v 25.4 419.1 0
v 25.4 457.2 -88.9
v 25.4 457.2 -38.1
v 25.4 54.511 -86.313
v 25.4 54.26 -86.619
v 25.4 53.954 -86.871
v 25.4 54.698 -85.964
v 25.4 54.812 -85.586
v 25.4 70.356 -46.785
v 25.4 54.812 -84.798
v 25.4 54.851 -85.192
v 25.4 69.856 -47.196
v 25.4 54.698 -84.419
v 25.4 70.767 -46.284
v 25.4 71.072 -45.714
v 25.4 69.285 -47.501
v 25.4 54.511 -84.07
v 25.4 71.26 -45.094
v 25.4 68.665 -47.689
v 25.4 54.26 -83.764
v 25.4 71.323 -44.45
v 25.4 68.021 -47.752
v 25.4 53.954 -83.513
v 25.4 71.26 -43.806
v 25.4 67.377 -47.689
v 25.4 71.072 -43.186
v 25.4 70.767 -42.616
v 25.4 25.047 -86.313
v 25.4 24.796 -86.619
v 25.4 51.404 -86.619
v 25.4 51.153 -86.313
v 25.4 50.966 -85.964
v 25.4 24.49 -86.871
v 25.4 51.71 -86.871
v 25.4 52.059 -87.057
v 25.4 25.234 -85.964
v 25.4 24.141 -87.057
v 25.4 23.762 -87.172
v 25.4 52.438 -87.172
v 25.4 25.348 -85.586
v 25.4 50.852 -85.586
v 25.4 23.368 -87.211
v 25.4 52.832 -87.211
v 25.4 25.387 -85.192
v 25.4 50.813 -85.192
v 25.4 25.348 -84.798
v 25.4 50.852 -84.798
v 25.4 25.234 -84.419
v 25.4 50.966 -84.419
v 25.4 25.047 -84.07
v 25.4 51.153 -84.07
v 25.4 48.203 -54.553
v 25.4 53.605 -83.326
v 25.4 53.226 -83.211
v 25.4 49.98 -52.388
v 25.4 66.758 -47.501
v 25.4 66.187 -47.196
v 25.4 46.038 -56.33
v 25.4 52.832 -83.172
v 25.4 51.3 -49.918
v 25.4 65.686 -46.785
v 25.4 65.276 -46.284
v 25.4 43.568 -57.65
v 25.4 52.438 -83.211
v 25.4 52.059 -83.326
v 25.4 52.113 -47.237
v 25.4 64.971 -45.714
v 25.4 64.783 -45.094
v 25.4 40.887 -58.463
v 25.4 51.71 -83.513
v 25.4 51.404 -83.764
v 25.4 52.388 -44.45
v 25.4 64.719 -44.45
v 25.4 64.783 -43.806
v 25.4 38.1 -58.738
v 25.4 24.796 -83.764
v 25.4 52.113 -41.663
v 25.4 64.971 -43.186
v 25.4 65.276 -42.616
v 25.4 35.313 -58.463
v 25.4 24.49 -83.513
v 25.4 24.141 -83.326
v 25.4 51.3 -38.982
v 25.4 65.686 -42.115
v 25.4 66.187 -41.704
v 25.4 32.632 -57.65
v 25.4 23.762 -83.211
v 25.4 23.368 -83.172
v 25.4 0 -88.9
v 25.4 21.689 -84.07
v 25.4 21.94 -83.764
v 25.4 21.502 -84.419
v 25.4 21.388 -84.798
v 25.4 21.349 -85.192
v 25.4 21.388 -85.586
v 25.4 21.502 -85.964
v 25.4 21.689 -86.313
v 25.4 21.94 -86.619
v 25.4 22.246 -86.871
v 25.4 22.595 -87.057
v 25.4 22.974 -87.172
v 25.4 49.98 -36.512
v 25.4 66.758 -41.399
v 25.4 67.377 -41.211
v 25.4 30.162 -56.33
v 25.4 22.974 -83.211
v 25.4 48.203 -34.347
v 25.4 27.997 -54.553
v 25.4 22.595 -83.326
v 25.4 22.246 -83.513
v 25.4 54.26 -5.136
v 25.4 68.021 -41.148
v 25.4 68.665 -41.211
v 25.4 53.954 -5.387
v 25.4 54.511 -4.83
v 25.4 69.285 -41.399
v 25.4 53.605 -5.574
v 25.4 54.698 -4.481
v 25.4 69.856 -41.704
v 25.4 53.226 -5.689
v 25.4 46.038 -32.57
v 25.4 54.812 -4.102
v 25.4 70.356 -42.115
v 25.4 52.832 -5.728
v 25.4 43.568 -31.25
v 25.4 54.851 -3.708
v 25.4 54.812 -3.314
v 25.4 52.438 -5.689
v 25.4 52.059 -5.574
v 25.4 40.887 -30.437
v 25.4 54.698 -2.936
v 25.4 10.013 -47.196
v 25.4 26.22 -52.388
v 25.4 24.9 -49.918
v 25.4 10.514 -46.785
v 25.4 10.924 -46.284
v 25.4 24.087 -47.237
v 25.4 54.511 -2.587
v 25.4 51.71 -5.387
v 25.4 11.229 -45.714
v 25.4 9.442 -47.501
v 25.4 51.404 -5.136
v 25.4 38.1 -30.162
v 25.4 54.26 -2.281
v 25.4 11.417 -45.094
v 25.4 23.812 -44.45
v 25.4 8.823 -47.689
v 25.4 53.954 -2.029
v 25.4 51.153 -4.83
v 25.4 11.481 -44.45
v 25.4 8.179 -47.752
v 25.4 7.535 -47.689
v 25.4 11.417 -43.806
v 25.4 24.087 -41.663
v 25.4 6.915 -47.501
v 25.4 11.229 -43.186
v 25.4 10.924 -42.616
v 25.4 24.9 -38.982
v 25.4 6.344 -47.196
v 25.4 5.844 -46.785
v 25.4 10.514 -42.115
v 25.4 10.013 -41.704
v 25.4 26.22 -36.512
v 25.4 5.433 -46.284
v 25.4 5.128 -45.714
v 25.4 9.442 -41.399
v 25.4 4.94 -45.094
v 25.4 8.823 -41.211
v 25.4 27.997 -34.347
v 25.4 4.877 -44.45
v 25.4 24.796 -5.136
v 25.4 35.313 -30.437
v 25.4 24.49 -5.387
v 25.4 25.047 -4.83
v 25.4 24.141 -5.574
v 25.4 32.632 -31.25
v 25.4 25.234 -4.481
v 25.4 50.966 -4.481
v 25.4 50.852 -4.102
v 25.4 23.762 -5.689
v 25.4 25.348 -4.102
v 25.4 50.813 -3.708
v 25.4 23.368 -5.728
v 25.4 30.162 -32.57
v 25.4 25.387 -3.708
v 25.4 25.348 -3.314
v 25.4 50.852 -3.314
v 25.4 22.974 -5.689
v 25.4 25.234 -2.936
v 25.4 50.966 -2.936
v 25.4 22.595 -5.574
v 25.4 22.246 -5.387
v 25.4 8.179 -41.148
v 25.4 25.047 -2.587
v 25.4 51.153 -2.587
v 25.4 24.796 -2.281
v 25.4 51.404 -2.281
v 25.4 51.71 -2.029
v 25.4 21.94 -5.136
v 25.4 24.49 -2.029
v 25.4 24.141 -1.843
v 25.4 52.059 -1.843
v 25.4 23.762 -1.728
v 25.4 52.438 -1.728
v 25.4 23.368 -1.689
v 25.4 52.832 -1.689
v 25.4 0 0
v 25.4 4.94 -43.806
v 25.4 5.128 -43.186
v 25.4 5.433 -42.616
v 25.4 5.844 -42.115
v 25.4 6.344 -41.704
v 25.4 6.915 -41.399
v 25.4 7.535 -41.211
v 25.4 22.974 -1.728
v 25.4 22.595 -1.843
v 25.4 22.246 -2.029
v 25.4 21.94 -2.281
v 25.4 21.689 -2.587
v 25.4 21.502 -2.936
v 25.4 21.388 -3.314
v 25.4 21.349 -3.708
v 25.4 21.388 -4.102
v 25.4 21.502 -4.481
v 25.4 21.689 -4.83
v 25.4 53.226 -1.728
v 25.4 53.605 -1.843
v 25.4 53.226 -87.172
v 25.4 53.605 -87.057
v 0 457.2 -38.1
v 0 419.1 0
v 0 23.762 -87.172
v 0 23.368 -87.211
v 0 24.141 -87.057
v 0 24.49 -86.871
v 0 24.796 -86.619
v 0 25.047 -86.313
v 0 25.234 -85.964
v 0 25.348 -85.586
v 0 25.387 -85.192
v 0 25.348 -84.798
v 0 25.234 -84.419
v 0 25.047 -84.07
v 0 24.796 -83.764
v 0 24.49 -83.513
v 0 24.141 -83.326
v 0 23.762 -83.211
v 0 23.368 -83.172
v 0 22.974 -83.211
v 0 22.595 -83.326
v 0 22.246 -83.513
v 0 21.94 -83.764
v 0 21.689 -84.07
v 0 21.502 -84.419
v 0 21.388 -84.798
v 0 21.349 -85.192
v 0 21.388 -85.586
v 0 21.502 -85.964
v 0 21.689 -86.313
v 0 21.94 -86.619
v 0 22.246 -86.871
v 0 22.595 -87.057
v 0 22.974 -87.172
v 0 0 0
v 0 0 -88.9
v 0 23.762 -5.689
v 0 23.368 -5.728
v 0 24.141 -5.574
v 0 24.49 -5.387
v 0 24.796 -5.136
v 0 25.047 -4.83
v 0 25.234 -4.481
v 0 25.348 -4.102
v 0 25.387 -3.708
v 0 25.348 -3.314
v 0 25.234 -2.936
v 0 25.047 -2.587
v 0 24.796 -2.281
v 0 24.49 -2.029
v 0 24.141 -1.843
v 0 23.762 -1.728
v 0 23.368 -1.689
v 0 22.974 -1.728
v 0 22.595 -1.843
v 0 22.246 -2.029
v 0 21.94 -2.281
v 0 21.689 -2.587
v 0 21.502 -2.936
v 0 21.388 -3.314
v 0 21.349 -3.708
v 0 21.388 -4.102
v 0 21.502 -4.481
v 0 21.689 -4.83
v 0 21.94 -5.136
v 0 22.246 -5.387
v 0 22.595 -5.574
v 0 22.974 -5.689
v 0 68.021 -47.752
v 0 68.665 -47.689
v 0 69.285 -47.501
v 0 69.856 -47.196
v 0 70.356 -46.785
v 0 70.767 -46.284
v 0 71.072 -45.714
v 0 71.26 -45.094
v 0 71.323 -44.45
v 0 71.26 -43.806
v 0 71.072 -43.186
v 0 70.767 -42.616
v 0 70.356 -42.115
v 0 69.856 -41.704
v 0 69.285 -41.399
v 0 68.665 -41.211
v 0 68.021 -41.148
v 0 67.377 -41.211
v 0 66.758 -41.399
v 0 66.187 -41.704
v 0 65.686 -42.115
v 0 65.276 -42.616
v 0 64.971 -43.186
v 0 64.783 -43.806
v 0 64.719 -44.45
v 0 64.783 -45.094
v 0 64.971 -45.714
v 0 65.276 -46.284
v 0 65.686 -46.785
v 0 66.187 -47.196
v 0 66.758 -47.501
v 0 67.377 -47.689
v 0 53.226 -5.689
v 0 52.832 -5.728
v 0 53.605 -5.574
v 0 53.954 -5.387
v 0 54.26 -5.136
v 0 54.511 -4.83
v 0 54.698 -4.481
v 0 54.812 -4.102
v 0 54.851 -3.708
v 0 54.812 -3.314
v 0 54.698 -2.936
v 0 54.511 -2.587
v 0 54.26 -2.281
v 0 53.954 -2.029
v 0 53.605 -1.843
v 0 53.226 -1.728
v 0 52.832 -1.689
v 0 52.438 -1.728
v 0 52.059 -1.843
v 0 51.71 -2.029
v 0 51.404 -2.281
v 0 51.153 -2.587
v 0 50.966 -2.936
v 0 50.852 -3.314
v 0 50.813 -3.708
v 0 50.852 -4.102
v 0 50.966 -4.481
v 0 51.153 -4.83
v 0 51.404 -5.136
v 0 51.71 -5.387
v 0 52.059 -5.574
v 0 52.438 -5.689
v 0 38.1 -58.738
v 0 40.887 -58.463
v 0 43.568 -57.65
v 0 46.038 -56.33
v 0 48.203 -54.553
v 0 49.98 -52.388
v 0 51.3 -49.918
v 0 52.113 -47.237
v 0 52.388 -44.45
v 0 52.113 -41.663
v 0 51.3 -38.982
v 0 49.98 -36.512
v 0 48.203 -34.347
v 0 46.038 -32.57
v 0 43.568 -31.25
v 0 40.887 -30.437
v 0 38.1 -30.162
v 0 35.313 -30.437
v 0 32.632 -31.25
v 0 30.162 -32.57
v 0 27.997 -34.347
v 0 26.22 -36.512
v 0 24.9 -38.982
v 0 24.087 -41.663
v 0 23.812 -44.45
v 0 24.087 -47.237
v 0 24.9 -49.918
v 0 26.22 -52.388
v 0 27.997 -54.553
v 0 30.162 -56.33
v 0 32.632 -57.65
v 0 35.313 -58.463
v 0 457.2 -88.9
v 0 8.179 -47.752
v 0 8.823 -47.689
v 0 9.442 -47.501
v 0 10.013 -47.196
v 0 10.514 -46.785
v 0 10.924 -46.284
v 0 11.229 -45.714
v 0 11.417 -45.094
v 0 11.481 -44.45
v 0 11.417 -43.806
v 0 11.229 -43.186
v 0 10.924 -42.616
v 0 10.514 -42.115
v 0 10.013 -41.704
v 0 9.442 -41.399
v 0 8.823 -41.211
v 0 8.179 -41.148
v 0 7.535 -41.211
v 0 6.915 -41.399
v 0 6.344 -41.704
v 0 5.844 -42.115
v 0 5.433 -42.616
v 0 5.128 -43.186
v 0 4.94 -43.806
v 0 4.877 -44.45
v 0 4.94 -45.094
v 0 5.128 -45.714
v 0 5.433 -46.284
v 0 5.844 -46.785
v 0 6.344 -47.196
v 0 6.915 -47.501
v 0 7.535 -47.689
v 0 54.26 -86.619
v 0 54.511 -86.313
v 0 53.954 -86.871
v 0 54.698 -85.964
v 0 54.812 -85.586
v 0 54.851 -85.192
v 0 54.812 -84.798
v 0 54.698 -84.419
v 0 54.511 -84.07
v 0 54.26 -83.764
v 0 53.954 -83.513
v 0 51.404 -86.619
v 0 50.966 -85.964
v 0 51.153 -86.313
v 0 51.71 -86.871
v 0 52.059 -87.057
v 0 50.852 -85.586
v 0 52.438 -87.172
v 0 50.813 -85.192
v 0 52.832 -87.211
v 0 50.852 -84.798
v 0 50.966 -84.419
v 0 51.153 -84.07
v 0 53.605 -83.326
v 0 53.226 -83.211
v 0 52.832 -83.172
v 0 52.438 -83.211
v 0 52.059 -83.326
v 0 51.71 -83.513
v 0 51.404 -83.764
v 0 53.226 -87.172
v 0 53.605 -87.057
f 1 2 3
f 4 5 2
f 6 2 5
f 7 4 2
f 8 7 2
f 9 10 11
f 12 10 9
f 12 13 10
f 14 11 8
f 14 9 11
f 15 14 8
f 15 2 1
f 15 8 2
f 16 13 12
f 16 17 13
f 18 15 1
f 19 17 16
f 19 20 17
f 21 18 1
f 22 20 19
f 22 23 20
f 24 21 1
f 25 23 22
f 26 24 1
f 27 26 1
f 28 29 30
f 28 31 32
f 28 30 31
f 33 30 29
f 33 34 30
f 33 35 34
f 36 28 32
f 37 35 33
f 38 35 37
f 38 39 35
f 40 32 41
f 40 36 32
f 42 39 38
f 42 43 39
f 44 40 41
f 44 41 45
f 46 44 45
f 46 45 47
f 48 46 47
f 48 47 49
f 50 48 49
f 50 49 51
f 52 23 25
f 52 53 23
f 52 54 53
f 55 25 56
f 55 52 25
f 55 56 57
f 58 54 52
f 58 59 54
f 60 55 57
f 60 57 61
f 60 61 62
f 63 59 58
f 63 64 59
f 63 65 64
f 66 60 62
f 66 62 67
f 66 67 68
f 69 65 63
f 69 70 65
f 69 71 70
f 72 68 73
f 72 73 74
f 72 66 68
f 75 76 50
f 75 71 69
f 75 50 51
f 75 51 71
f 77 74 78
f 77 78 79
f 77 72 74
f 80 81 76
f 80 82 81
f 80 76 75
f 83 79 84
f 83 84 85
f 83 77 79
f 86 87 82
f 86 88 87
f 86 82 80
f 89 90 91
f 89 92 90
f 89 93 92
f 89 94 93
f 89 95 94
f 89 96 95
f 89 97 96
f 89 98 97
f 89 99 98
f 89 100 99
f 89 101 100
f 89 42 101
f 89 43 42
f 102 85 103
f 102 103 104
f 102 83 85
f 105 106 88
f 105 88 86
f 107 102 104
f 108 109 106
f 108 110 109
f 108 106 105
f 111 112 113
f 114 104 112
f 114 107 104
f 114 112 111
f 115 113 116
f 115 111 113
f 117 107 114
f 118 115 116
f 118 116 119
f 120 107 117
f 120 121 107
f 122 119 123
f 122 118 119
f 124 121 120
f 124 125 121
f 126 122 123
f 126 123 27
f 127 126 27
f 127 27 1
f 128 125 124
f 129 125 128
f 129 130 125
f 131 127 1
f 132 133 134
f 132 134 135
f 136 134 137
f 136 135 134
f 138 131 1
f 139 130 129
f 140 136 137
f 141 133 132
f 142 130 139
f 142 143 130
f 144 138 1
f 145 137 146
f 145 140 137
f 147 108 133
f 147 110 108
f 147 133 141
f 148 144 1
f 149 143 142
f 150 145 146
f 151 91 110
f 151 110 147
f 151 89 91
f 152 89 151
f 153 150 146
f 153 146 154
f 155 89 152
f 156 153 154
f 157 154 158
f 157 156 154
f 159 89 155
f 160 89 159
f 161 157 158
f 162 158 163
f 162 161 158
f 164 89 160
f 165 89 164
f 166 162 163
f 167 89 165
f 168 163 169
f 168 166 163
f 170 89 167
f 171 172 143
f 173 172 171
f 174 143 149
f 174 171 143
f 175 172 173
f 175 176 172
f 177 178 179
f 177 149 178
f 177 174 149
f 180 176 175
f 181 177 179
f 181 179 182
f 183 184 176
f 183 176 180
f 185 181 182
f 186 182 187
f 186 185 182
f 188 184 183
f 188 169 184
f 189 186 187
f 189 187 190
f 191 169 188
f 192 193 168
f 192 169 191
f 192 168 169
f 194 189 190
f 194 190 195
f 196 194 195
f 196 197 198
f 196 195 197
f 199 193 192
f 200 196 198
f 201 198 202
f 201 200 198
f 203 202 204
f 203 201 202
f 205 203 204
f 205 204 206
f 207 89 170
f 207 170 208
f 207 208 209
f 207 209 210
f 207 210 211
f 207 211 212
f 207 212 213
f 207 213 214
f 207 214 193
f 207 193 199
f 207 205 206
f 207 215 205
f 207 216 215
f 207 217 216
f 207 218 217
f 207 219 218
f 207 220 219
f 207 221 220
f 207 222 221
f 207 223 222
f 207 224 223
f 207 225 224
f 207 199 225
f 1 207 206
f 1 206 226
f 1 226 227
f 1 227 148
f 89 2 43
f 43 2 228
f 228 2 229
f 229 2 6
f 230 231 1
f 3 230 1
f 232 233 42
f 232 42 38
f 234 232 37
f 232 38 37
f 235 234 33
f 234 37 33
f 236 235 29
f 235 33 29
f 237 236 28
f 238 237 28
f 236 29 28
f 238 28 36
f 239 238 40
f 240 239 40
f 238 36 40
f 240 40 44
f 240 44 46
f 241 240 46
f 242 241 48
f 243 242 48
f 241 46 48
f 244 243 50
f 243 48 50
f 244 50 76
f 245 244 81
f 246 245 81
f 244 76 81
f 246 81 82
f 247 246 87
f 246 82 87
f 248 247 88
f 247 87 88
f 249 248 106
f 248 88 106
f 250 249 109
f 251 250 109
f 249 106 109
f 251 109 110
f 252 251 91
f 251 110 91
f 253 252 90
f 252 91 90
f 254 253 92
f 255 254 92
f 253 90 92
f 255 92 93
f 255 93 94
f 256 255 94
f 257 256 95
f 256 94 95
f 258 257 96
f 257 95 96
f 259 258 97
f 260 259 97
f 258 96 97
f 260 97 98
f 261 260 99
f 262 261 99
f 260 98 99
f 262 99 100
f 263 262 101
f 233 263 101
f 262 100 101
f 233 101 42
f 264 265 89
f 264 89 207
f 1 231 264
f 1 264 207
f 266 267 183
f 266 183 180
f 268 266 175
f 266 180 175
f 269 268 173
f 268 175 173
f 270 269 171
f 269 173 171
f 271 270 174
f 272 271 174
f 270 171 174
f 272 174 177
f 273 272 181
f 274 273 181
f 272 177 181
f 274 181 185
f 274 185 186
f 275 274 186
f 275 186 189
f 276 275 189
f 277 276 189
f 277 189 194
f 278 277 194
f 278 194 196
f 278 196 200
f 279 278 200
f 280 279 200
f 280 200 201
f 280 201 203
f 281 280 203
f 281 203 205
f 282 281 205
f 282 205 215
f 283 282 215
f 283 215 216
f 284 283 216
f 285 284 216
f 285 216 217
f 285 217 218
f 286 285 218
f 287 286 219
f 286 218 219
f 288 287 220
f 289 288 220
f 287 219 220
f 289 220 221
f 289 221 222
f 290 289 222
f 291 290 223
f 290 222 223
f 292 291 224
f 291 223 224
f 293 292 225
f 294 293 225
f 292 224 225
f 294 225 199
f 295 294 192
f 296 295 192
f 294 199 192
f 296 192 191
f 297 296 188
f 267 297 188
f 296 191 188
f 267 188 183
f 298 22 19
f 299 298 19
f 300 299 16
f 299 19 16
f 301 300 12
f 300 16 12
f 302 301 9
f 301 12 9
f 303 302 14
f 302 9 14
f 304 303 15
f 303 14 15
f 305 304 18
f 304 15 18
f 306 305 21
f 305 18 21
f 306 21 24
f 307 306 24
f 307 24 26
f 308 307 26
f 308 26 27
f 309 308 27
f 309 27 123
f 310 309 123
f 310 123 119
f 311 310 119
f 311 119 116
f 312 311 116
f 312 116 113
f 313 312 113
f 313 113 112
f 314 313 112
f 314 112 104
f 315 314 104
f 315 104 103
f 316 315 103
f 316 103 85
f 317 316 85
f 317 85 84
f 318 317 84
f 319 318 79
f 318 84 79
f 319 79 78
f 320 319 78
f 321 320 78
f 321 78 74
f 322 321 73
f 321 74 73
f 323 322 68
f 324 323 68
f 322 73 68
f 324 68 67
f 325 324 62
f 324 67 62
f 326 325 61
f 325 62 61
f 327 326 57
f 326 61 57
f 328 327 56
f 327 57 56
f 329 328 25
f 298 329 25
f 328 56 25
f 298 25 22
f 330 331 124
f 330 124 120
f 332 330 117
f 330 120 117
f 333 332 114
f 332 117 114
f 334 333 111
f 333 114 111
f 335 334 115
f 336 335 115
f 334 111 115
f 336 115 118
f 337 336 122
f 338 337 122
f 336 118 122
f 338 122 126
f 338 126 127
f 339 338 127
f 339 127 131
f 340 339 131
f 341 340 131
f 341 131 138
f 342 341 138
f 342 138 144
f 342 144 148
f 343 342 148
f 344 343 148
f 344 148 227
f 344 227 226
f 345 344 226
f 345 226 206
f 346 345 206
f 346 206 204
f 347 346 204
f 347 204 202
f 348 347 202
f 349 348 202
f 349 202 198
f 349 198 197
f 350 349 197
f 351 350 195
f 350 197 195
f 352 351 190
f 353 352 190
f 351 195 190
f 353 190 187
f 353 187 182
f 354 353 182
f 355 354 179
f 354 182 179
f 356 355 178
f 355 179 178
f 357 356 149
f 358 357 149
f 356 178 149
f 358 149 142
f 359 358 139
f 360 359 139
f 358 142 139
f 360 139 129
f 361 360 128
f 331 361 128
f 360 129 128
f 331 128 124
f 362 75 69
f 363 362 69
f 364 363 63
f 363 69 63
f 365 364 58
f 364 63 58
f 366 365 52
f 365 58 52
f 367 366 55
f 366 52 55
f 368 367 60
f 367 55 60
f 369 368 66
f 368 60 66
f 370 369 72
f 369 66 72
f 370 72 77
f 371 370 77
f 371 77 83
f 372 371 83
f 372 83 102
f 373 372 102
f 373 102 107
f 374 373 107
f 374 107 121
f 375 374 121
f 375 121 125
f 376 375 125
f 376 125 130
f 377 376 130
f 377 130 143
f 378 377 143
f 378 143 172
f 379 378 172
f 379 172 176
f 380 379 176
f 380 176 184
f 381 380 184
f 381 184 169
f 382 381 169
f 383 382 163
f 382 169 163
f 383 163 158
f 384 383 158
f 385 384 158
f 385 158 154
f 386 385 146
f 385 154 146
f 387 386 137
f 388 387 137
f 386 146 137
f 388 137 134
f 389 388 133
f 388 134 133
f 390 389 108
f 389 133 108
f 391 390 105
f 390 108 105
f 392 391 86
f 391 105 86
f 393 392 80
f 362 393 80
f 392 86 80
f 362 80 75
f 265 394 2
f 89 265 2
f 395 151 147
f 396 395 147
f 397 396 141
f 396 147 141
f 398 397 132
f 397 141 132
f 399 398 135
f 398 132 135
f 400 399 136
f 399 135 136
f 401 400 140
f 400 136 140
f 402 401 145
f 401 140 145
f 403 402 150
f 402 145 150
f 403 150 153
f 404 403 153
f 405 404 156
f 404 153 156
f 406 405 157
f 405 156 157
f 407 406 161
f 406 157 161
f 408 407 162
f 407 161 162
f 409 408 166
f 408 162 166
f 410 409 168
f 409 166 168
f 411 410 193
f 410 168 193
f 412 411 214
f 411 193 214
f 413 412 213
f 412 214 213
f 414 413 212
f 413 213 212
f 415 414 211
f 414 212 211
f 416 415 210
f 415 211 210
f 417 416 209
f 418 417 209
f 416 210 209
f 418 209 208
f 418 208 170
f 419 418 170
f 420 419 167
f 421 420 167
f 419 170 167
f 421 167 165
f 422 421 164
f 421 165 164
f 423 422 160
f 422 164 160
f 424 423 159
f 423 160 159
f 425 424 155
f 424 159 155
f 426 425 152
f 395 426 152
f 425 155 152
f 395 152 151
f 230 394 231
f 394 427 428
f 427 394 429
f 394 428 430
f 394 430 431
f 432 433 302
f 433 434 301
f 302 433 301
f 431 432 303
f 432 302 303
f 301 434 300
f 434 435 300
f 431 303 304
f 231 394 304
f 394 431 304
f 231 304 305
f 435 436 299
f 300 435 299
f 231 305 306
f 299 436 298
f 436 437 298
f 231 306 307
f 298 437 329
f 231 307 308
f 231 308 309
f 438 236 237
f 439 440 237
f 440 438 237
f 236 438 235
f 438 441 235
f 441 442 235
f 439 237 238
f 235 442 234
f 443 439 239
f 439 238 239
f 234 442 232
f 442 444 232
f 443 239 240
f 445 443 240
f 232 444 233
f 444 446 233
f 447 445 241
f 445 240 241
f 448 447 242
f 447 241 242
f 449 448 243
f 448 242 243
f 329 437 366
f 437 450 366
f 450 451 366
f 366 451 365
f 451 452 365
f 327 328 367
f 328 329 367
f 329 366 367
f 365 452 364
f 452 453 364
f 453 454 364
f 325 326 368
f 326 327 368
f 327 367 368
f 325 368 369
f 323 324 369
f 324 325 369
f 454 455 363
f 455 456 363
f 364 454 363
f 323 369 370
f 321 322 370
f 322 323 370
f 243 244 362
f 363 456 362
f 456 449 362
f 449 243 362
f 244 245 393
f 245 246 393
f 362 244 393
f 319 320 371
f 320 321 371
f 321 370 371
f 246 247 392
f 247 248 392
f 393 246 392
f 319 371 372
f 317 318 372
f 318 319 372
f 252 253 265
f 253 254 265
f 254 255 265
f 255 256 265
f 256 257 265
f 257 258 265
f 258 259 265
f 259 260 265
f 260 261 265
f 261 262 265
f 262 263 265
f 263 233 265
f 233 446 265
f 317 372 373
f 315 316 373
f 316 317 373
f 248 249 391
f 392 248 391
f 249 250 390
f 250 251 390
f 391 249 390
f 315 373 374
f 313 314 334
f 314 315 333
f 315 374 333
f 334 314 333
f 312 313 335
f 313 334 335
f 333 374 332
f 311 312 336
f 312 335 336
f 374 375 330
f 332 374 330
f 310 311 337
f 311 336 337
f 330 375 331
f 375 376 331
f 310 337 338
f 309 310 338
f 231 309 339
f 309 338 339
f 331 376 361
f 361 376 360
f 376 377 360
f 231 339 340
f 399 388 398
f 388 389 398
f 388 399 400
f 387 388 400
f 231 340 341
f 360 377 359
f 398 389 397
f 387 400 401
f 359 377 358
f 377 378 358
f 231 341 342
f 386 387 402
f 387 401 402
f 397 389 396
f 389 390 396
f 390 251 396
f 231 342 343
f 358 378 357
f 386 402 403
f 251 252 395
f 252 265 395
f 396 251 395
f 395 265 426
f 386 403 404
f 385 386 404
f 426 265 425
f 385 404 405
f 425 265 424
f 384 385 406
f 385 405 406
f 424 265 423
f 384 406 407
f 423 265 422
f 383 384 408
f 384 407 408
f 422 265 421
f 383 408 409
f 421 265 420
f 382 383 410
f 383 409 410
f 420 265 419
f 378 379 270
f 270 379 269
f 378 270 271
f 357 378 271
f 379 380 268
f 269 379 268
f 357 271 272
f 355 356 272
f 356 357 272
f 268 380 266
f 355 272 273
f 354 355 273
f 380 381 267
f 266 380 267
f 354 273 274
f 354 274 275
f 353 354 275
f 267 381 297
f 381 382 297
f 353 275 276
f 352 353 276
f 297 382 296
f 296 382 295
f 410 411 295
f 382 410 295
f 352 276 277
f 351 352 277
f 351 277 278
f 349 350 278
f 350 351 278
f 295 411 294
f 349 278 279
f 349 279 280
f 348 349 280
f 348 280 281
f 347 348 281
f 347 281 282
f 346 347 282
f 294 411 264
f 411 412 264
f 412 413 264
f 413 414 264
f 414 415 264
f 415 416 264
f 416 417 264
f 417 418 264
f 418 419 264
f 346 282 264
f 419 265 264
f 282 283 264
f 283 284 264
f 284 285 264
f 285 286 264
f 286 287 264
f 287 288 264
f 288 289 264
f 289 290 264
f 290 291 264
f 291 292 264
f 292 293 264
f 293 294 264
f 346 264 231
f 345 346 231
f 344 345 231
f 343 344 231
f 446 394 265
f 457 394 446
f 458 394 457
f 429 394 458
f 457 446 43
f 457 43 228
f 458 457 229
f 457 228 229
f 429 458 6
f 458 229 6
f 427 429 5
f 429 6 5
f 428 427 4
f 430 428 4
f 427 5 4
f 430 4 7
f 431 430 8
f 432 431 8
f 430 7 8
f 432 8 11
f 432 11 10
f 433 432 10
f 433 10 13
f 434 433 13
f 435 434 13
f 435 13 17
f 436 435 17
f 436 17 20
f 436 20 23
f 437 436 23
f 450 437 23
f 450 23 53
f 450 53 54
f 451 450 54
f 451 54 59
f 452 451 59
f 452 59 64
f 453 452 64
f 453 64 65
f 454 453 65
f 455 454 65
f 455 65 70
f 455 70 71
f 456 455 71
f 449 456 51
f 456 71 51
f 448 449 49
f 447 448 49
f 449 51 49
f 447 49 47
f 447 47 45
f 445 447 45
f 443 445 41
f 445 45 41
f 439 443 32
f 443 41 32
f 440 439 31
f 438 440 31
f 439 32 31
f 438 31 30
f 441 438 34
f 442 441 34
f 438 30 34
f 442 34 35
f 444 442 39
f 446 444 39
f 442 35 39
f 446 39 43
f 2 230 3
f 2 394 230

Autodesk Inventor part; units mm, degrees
ref_plane "YZ Plane" through (0, 0, 0) normal (1, 0, 0) x (0, 1, 0)
ref_plane "XZ Plane" through (0, 0, 0) normal (0, 1, 0) x (-1, 0, 0)
ref_plane "XY Plane" through (0, 0, 0) normal (0, 0, 1) x (1, 0, 0)
sketch "Sketch1" plane through (0, 0, 0) normal (1, 0, 0) x (0, 1, 0)
  line L0 (0, 0) -> (76.2, 0)
  line L1 (76.2, 0) -> (76.2, -88.9)
  line L2 (76.2, -88.9) -> (0, -88.9)
  line L3 (0, -88.9) -> (0, 0)
  dimension "d0" = 76.2
  dimension "d1" = 88.9
extrude "Extrusion1" add sketch "Sketch1" along normal blind 25.4
sketch "Sketch2" plane through (25.4, 0, 0) normal (1, 0, 0) x (0, 0, -1)
  line L0 (88.9, 76.2) -> (0, 76.2) projected
  line L1 (44.45, 76.2) -> (44.45, 0)
  line L2 (0, 0) -> (88.9, 0) projected
  circle A0 centre (44.45, 38.1) radius 14.2875
  line L3 (44.45, 38.1) -> (3.7084, 38.1)
  circle A1 centre (3.7084, 52.832) radius 2.0193
  circle A2 centre (3.7084, 23.368) radius 2.0193
  circle A3 centre (85.1916, 52.832) radius 2.0193
  circle A4 centre (85.1916, 23.368) radius 2.0193
  line L4 (44.45, 38.1) -> (44.45, 68.0212)
  circle A5 centre (44.45, 68.0212) radius 3.302
  circle A6 centre (44.45, 8.1788) radius 3.302
  point P0 (85.1916, 38.1)
  dimension "d4" = 28.575
  dimension "d5" = 40.7416
  dimension "d8" = 29.9212
  dimension "d9" = 6.604
extrude "Extrusion2" cut sketch "Sketch2" against normal up to surface (25.4 mm away)
sketch "Sketch3" plane through (0, 76.2, 0) normal (0, 1, 0) x (1, 0, 0)
  line L0 (0, 88.9) -> (0, 0) projected
  line L1 (0, 0) -> (25.4, 0) projected
  line L2 (25.4, 88.9) -> (25.4, 0) projected
  line L3 (0, 88.9) -> (25.4, 88.9) projected
extrude "Extrusion3" add sketch "Sketch3" along normal blind 381
chamfer "Chamfer1" distance 38.1 angle 45 1 edges at (12.7, 457.2, 0)
properties part number "launcherV2"
